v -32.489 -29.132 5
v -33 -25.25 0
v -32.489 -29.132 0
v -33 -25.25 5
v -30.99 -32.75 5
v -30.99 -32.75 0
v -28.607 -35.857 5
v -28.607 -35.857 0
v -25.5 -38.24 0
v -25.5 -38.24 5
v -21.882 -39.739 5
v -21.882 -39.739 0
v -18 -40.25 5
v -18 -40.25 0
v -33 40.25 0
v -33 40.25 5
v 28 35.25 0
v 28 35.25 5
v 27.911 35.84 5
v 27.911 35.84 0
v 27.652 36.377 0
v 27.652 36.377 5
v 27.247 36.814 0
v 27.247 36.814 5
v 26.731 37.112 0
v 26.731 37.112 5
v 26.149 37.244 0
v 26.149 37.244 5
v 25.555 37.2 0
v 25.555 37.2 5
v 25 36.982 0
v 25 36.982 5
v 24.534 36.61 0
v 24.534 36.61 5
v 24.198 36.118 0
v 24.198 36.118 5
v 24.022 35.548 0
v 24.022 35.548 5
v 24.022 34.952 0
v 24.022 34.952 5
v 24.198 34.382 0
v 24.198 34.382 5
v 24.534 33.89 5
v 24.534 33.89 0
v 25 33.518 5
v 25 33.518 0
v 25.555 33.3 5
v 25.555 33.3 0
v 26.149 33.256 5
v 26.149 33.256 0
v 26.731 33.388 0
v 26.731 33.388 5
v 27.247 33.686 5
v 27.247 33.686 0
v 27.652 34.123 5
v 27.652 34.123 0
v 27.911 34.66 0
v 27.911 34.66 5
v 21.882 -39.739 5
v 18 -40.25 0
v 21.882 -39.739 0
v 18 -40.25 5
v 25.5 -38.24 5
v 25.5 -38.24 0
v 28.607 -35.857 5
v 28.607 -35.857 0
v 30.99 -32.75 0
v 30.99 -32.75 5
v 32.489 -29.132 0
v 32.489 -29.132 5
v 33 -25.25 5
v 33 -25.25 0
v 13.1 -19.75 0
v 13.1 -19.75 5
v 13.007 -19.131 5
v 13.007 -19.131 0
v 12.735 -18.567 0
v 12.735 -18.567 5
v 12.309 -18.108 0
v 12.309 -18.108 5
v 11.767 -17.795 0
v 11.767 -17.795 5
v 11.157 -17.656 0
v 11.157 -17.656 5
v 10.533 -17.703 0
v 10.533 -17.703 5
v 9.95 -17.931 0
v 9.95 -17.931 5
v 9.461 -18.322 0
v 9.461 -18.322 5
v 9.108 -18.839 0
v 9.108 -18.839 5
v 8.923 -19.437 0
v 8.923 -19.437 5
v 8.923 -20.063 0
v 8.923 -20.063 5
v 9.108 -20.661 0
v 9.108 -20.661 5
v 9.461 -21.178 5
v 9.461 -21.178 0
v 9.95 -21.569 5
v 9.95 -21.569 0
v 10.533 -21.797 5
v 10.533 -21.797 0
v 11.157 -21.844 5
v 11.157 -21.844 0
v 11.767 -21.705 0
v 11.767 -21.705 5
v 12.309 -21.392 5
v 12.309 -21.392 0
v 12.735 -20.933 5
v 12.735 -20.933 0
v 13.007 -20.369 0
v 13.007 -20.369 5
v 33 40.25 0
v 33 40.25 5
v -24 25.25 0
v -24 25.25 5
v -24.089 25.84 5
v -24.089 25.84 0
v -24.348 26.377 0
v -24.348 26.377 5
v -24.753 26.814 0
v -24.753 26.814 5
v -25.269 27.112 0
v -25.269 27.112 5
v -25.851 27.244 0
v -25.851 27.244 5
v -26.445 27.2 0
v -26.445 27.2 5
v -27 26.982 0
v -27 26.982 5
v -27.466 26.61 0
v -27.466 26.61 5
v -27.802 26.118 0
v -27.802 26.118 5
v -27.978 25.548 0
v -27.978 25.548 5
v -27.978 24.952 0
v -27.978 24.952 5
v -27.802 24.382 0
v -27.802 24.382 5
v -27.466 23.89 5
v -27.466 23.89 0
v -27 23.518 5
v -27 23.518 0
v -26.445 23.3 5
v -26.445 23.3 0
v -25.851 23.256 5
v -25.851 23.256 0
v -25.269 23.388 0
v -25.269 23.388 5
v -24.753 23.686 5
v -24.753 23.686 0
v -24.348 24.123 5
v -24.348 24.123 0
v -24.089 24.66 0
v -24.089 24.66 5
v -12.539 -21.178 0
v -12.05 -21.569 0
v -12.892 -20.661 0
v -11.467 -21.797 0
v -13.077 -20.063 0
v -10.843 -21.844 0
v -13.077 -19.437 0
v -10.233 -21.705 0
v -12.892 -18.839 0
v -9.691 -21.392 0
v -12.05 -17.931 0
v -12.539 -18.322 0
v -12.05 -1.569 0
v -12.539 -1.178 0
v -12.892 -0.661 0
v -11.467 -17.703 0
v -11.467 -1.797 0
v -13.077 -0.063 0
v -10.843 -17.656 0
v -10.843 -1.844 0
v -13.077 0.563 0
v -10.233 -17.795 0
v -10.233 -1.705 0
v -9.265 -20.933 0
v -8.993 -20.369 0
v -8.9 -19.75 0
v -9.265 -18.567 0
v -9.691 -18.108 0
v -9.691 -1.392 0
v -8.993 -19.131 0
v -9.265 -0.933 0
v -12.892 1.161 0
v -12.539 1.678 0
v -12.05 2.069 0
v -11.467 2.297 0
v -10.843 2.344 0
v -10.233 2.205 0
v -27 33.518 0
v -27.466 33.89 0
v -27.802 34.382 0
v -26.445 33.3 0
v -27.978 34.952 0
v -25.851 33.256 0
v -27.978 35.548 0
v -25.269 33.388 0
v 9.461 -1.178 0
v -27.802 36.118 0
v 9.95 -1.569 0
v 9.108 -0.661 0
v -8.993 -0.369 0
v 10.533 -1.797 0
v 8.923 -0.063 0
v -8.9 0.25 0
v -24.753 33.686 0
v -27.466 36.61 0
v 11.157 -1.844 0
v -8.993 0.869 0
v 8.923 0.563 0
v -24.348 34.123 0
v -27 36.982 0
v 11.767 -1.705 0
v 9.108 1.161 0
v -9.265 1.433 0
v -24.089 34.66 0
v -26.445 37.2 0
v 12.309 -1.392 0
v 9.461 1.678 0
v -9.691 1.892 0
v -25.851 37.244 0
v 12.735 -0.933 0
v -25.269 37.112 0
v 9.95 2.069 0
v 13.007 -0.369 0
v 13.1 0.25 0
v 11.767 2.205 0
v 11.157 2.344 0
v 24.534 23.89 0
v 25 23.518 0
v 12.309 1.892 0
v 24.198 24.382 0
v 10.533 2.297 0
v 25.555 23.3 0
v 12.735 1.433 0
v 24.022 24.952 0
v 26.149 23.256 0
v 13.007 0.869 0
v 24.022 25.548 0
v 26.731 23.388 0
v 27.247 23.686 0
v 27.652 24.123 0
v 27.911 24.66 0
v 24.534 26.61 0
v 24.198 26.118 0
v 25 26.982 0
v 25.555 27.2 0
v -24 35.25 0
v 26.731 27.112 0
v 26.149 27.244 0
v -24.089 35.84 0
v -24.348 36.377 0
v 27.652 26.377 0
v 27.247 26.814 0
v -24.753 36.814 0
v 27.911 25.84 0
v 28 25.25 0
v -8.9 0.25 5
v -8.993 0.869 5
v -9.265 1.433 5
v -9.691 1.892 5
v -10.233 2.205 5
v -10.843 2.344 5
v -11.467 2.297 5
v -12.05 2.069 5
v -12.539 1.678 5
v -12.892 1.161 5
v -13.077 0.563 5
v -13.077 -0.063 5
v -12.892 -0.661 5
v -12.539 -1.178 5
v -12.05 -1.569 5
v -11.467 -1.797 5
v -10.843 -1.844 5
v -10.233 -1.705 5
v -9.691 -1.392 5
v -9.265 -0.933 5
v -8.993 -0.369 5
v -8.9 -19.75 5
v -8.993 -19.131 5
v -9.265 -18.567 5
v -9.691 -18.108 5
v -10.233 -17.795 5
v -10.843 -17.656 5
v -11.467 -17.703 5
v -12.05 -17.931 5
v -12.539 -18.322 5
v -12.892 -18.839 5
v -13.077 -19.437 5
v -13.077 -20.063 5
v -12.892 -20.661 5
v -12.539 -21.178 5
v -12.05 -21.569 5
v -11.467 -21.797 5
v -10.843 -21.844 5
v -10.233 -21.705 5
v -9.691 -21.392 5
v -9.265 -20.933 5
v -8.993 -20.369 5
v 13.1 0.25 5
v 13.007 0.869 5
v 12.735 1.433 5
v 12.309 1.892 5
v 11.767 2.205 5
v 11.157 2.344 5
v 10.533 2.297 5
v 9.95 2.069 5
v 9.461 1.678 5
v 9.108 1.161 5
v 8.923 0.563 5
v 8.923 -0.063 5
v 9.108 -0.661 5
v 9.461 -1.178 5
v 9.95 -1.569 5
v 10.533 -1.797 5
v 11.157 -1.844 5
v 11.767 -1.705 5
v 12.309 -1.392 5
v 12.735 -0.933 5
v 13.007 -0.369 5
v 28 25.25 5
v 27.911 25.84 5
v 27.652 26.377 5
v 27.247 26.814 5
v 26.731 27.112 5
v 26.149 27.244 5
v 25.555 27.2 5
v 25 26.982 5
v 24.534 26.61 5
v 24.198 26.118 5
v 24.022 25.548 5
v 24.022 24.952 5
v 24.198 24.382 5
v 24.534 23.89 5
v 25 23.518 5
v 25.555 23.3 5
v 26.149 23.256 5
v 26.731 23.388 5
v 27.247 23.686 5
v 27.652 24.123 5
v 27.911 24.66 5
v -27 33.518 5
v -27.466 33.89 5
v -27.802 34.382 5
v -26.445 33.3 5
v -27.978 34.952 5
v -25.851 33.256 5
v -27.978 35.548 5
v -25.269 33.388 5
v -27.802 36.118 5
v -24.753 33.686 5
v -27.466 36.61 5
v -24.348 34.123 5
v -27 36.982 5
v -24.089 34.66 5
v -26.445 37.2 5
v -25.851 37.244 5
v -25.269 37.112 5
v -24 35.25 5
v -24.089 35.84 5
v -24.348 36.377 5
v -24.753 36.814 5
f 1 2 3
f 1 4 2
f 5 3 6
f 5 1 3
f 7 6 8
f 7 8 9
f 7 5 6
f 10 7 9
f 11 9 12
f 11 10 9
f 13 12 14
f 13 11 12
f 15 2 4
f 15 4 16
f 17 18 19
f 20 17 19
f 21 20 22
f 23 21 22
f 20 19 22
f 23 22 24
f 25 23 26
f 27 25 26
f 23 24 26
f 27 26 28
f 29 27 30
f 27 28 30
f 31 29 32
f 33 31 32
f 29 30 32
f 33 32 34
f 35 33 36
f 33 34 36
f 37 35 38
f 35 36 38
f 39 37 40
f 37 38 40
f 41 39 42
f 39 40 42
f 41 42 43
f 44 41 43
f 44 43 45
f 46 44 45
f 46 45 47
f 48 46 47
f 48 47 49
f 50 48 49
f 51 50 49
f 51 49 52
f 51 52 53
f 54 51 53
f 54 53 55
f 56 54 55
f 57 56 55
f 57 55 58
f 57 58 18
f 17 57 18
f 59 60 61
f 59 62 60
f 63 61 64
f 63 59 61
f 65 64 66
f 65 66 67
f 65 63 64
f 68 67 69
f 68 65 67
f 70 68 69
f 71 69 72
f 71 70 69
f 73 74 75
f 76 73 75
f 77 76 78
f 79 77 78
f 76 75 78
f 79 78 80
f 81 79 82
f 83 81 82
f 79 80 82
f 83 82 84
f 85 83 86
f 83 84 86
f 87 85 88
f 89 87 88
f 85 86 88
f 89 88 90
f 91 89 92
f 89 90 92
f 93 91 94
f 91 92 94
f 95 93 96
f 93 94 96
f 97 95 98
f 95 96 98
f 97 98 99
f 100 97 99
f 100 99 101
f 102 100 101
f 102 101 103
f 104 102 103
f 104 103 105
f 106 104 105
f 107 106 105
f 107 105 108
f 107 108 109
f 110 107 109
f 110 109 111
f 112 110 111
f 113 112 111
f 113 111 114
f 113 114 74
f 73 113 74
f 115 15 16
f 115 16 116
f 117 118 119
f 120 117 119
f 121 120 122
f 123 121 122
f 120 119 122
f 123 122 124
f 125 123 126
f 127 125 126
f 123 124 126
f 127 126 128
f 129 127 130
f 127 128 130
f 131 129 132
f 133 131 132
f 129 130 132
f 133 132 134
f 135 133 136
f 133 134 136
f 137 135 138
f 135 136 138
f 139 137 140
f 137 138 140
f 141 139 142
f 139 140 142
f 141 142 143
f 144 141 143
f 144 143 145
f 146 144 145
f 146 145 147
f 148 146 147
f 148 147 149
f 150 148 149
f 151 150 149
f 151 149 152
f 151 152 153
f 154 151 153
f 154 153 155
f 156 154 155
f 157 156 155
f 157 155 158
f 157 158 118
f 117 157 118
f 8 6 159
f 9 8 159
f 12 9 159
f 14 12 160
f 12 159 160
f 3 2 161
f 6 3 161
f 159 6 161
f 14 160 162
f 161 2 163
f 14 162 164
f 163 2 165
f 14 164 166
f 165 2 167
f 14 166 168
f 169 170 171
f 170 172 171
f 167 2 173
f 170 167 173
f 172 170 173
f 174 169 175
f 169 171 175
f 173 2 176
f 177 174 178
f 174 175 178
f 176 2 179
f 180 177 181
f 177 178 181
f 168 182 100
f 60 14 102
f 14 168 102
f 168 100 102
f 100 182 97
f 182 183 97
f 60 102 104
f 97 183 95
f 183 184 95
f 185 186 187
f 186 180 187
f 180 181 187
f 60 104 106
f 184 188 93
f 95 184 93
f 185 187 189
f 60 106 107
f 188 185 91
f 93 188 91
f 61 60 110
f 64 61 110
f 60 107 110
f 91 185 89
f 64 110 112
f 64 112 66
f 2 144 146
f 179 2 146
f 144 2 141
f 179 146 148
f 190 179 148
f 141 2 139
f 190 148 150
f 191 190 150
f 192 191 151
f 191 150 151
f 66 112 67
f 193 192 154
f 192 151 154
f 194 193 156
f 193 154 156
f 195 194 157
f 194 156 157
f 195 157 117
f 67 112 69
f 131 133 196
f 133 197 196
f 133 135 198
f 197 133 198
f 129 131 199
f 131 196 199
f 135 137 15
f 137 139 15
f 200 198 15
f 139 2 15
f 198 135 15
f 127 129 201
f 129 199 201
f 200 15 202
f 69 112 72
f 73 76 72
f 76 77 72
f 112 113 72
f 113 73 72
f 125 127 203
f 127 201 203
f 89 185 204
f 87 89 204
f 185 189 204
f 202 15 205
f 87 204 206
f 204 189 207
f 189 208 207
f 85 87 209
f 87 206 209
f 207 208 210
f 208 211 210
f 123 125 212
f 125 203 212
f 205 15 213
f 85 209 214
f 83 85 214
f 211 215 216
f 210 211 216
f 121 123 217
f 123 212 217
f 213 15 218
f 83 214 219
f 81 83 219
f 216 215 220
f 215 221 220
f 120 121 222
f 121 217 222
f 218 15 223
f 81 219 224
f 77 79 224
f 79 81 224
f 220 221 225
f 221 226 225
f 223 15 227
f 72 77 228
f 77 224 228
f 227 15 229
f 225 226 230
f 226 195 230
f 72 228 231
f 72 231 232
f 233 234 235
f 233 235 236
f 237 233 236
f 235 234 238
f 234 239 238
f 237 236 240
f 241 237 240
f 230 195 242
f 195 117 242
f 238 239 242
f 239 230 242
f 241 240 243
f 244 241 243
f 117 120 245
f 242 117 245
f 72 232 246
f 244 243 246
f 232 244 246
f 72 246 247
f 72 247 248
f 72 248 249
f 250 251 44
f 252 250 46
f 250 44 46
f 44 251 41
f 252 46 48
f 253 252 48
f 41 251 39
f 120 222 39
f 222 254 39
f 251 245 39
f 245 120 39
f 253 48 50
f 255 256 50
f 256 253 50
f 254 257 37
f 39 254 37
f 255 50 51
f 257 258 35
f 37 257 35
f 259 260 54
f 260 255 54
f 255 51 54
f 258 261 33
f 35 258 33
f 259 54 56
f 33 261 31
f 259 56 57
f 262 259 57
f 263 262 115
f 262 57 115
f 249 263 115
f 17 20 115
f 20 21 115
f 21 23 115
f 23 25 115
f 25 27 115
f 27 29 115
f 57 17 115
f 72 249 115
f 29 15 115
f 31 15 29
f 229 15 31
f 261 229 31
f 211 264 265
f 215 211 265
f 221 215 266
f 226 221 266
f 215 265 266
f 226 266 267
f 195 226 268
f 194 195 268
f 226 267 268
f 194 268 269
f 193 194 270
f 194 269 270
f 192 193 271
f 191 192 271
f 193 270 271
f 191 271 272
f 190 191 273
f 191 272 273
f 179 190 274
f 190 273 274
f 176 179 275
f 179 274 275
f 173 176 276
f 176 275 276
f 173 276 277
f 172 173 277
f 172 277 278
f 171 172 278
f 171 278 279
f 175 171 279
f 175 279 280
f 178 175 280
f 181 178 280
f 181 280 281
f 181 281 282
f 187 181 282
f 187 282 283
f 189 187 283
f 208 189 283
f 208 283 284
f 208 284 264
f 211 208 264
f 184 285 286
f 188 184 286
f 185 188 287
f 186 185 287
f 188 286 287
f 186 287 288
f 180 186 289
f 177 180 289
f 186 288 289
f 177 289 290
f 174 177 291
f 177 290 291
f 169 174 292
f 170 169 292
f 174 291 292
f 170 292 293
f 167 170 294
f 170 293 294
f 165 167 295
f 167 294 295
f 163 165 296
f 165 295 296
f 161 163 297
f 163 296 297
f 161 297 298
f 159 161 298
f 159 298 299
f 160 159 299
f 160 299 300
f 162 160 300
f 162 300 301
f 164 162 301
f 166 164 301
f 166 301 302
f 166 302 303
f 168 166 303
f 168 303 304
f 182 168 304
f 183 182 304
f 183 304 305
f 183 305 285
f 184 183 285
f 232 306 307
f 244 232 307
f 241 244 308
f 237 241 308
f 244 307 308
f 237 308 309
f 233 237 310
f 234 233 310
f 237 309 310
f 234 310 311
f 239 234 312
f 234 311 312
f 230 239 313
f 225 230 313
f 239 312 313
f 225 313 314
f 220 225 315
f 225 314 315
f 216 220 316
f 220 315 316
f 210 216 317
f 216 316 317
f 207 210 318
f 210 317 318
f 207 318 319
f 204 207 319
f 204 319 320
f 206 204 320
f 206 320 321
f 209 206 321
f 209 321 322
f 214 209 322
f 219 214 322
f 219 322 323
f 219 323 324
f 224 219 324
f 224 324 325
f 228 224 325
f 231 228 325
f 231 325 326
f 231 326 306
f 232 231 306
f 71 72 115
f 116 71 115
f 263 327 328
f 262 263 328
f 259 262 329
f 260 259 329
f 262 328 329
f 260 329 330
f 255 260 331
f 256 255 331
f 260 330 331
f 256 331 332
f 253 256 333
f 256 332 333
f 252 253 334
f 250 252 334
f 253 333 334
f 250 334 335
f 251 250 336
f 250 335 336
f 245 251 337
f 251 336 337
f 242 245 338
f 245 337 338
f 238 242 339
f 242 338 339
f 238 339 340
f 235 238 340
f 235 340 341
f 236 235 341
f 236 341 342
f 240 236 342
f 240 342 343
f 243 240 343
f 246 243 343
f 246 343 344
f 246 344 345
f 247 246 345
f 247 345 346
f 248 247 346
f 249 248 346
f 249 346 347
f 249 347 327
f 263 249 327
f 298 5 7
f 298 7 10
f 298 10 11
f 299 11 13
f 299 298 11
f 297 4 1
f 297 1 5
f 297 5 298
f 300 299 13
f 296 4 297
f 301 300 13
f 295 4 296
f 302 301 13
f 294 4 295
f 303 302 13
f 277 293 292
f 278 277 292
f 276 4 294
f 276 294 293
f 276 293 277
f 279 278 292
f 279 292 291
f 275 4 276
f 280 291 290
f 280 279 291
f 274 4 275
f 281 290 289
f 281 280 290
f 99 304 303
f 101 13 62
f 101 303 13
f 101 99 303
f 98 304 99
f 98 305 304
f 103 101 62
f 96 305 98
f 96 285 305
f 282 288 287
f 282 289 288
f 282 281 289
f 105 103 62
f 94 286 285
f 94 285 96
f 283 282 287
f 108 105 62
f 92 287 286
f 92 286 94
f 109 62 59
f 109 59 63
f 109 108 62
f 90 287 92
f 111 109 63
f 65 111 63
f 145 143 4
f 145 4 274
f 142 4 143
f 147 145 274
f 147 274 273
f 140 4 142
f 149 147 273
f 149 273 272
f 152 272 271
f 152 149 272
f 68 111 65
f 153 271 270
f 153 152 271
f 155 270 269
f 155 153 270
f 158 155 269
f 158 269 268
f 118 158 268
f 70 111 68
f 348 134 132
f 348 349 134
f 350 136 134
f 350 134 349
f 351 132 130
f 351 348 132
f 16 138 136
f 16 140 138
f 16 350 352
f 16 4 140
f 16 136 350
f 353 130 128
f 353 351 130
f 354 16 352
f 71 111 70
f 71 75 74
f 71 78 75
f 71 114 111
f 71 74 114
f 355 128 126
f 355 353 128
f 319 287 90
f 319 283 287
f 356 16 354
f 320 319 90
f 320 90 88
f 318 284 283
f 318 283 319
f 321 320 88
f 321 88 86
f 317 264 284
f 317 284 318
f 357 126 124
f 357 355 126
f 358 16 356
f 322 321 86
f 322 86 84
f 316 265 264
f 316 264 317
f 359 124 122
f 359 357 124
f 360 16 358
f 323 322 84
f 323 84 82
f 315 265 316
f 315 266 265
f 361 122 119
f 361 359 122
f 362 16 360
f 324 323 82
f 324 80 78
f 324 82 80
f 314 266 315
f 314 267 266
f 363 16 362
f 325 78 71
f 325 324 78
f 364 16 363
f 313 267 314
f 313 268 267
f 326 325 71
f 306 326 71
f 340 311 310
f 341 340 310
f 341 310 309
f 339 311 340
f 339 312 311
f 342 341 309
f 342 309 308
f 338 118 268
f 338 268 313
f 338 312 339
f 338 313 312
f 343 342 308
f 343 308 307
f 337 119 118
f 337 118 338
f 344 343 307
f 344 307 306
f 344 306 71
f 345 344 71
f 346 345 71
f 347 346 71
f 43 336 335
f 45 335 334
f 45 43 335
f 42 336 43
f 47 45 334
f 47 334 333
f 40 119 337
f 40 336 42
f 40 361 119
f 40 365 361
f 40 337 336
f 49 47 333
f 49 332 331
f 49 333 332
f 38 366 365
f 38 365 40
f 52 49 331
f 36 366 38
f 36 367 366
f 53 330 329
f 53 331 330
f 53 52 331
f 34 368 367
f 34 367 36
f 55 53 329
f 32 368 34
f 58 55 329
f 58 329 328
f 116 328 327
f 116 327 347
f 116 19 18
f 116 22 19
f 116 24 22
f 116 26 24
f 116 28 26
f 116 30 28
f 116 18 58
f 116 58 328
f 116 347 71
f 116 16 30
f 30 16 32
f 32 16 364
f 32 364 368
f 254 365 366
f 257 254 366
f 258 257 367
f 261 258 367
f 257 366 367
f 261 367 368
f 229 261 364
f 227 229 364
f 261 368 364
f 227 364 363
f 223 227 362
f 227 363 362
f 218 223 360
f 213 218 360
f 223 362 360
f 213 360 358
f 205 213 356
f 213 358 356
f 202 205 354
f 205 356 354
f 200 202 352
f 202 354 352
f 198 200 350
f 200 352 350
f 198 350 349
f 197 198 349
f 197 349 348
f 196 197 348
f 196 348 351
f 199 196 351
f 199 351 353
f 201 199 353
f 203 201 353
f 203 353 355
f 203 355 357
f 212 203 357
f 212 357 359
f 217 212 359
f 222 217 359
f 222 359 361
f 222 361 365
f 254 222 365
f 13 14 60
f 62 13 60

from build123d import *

# Parameters (mm, degrees)
SKETCH_1_W          = 66
SKETCH_1_H          = 80.5
EXTRUDE_1_DEPTH     = 5
SKETCH_2_R          = 2
CUT_EXTRUDE_1_DEPTH = 53.288263501
SKETCH_3_R          = 2.1
CUT_EXTRUDE_2_DEPTH = 10
FILLET_1_R          = 15


with BuildPart() as part:
    # 草图1 → 凸台-拉伸1 (new body)
    with BuildSketch(Plane.XY):
        Rectangle(SKETCH_1_W, SKETCH_1_H)
    extrude(amount=EXTRUDE_1_DEPTH)

    # 草图2 → 切除-拉伸1 (cut, through all)
    with BuildSketch(Plane.XY.offset(5)):
        with Locations((-26, 35.25)):
            Circle(SKETCH_2_R)
        with Locations((26, 35.25)):
            Circle(SKETCH_2_R)
        with Locations((26, 25.25)):
            Circle(SKETCH_2_R)
        with Locations((-26, 25.25)):
            Circle(SKETCH_2_R)
    extrude(amount=-CUT_EXTRUDE_1_DEPTH, mode=Mode.SUBTRACT)

    # 草图3 → 切除-拉伸2 (cut)
    with BuildSketch(Plane.XY.offset(5)):
        with Locations((-11, 0.25)):
            Circle(SKETCH_3_R)
        with Locations((11, 0.25)):
            Circle(SKETCH_3_R)
        with Locations((11, -19.75)):
            Circle(SKETCH_3_R)
        with Locations((-11, -19.75)):
            Circle(SKETCH_3_R)
    extrude(amount=-CUT_EXTRUDE_2_DEPTH, mode=Mode.SUBTRACT)

    # 圆角1
    fillet_1_edges = [part.edges().sort_by_distance(p)[0] for p in [
        (33, -40.25, 2.5),
        (-33, -40.25, 2.5),
    ]]
    fillet(fillet_1_edges, radius=FILLET_1_R)


solid = part.part
